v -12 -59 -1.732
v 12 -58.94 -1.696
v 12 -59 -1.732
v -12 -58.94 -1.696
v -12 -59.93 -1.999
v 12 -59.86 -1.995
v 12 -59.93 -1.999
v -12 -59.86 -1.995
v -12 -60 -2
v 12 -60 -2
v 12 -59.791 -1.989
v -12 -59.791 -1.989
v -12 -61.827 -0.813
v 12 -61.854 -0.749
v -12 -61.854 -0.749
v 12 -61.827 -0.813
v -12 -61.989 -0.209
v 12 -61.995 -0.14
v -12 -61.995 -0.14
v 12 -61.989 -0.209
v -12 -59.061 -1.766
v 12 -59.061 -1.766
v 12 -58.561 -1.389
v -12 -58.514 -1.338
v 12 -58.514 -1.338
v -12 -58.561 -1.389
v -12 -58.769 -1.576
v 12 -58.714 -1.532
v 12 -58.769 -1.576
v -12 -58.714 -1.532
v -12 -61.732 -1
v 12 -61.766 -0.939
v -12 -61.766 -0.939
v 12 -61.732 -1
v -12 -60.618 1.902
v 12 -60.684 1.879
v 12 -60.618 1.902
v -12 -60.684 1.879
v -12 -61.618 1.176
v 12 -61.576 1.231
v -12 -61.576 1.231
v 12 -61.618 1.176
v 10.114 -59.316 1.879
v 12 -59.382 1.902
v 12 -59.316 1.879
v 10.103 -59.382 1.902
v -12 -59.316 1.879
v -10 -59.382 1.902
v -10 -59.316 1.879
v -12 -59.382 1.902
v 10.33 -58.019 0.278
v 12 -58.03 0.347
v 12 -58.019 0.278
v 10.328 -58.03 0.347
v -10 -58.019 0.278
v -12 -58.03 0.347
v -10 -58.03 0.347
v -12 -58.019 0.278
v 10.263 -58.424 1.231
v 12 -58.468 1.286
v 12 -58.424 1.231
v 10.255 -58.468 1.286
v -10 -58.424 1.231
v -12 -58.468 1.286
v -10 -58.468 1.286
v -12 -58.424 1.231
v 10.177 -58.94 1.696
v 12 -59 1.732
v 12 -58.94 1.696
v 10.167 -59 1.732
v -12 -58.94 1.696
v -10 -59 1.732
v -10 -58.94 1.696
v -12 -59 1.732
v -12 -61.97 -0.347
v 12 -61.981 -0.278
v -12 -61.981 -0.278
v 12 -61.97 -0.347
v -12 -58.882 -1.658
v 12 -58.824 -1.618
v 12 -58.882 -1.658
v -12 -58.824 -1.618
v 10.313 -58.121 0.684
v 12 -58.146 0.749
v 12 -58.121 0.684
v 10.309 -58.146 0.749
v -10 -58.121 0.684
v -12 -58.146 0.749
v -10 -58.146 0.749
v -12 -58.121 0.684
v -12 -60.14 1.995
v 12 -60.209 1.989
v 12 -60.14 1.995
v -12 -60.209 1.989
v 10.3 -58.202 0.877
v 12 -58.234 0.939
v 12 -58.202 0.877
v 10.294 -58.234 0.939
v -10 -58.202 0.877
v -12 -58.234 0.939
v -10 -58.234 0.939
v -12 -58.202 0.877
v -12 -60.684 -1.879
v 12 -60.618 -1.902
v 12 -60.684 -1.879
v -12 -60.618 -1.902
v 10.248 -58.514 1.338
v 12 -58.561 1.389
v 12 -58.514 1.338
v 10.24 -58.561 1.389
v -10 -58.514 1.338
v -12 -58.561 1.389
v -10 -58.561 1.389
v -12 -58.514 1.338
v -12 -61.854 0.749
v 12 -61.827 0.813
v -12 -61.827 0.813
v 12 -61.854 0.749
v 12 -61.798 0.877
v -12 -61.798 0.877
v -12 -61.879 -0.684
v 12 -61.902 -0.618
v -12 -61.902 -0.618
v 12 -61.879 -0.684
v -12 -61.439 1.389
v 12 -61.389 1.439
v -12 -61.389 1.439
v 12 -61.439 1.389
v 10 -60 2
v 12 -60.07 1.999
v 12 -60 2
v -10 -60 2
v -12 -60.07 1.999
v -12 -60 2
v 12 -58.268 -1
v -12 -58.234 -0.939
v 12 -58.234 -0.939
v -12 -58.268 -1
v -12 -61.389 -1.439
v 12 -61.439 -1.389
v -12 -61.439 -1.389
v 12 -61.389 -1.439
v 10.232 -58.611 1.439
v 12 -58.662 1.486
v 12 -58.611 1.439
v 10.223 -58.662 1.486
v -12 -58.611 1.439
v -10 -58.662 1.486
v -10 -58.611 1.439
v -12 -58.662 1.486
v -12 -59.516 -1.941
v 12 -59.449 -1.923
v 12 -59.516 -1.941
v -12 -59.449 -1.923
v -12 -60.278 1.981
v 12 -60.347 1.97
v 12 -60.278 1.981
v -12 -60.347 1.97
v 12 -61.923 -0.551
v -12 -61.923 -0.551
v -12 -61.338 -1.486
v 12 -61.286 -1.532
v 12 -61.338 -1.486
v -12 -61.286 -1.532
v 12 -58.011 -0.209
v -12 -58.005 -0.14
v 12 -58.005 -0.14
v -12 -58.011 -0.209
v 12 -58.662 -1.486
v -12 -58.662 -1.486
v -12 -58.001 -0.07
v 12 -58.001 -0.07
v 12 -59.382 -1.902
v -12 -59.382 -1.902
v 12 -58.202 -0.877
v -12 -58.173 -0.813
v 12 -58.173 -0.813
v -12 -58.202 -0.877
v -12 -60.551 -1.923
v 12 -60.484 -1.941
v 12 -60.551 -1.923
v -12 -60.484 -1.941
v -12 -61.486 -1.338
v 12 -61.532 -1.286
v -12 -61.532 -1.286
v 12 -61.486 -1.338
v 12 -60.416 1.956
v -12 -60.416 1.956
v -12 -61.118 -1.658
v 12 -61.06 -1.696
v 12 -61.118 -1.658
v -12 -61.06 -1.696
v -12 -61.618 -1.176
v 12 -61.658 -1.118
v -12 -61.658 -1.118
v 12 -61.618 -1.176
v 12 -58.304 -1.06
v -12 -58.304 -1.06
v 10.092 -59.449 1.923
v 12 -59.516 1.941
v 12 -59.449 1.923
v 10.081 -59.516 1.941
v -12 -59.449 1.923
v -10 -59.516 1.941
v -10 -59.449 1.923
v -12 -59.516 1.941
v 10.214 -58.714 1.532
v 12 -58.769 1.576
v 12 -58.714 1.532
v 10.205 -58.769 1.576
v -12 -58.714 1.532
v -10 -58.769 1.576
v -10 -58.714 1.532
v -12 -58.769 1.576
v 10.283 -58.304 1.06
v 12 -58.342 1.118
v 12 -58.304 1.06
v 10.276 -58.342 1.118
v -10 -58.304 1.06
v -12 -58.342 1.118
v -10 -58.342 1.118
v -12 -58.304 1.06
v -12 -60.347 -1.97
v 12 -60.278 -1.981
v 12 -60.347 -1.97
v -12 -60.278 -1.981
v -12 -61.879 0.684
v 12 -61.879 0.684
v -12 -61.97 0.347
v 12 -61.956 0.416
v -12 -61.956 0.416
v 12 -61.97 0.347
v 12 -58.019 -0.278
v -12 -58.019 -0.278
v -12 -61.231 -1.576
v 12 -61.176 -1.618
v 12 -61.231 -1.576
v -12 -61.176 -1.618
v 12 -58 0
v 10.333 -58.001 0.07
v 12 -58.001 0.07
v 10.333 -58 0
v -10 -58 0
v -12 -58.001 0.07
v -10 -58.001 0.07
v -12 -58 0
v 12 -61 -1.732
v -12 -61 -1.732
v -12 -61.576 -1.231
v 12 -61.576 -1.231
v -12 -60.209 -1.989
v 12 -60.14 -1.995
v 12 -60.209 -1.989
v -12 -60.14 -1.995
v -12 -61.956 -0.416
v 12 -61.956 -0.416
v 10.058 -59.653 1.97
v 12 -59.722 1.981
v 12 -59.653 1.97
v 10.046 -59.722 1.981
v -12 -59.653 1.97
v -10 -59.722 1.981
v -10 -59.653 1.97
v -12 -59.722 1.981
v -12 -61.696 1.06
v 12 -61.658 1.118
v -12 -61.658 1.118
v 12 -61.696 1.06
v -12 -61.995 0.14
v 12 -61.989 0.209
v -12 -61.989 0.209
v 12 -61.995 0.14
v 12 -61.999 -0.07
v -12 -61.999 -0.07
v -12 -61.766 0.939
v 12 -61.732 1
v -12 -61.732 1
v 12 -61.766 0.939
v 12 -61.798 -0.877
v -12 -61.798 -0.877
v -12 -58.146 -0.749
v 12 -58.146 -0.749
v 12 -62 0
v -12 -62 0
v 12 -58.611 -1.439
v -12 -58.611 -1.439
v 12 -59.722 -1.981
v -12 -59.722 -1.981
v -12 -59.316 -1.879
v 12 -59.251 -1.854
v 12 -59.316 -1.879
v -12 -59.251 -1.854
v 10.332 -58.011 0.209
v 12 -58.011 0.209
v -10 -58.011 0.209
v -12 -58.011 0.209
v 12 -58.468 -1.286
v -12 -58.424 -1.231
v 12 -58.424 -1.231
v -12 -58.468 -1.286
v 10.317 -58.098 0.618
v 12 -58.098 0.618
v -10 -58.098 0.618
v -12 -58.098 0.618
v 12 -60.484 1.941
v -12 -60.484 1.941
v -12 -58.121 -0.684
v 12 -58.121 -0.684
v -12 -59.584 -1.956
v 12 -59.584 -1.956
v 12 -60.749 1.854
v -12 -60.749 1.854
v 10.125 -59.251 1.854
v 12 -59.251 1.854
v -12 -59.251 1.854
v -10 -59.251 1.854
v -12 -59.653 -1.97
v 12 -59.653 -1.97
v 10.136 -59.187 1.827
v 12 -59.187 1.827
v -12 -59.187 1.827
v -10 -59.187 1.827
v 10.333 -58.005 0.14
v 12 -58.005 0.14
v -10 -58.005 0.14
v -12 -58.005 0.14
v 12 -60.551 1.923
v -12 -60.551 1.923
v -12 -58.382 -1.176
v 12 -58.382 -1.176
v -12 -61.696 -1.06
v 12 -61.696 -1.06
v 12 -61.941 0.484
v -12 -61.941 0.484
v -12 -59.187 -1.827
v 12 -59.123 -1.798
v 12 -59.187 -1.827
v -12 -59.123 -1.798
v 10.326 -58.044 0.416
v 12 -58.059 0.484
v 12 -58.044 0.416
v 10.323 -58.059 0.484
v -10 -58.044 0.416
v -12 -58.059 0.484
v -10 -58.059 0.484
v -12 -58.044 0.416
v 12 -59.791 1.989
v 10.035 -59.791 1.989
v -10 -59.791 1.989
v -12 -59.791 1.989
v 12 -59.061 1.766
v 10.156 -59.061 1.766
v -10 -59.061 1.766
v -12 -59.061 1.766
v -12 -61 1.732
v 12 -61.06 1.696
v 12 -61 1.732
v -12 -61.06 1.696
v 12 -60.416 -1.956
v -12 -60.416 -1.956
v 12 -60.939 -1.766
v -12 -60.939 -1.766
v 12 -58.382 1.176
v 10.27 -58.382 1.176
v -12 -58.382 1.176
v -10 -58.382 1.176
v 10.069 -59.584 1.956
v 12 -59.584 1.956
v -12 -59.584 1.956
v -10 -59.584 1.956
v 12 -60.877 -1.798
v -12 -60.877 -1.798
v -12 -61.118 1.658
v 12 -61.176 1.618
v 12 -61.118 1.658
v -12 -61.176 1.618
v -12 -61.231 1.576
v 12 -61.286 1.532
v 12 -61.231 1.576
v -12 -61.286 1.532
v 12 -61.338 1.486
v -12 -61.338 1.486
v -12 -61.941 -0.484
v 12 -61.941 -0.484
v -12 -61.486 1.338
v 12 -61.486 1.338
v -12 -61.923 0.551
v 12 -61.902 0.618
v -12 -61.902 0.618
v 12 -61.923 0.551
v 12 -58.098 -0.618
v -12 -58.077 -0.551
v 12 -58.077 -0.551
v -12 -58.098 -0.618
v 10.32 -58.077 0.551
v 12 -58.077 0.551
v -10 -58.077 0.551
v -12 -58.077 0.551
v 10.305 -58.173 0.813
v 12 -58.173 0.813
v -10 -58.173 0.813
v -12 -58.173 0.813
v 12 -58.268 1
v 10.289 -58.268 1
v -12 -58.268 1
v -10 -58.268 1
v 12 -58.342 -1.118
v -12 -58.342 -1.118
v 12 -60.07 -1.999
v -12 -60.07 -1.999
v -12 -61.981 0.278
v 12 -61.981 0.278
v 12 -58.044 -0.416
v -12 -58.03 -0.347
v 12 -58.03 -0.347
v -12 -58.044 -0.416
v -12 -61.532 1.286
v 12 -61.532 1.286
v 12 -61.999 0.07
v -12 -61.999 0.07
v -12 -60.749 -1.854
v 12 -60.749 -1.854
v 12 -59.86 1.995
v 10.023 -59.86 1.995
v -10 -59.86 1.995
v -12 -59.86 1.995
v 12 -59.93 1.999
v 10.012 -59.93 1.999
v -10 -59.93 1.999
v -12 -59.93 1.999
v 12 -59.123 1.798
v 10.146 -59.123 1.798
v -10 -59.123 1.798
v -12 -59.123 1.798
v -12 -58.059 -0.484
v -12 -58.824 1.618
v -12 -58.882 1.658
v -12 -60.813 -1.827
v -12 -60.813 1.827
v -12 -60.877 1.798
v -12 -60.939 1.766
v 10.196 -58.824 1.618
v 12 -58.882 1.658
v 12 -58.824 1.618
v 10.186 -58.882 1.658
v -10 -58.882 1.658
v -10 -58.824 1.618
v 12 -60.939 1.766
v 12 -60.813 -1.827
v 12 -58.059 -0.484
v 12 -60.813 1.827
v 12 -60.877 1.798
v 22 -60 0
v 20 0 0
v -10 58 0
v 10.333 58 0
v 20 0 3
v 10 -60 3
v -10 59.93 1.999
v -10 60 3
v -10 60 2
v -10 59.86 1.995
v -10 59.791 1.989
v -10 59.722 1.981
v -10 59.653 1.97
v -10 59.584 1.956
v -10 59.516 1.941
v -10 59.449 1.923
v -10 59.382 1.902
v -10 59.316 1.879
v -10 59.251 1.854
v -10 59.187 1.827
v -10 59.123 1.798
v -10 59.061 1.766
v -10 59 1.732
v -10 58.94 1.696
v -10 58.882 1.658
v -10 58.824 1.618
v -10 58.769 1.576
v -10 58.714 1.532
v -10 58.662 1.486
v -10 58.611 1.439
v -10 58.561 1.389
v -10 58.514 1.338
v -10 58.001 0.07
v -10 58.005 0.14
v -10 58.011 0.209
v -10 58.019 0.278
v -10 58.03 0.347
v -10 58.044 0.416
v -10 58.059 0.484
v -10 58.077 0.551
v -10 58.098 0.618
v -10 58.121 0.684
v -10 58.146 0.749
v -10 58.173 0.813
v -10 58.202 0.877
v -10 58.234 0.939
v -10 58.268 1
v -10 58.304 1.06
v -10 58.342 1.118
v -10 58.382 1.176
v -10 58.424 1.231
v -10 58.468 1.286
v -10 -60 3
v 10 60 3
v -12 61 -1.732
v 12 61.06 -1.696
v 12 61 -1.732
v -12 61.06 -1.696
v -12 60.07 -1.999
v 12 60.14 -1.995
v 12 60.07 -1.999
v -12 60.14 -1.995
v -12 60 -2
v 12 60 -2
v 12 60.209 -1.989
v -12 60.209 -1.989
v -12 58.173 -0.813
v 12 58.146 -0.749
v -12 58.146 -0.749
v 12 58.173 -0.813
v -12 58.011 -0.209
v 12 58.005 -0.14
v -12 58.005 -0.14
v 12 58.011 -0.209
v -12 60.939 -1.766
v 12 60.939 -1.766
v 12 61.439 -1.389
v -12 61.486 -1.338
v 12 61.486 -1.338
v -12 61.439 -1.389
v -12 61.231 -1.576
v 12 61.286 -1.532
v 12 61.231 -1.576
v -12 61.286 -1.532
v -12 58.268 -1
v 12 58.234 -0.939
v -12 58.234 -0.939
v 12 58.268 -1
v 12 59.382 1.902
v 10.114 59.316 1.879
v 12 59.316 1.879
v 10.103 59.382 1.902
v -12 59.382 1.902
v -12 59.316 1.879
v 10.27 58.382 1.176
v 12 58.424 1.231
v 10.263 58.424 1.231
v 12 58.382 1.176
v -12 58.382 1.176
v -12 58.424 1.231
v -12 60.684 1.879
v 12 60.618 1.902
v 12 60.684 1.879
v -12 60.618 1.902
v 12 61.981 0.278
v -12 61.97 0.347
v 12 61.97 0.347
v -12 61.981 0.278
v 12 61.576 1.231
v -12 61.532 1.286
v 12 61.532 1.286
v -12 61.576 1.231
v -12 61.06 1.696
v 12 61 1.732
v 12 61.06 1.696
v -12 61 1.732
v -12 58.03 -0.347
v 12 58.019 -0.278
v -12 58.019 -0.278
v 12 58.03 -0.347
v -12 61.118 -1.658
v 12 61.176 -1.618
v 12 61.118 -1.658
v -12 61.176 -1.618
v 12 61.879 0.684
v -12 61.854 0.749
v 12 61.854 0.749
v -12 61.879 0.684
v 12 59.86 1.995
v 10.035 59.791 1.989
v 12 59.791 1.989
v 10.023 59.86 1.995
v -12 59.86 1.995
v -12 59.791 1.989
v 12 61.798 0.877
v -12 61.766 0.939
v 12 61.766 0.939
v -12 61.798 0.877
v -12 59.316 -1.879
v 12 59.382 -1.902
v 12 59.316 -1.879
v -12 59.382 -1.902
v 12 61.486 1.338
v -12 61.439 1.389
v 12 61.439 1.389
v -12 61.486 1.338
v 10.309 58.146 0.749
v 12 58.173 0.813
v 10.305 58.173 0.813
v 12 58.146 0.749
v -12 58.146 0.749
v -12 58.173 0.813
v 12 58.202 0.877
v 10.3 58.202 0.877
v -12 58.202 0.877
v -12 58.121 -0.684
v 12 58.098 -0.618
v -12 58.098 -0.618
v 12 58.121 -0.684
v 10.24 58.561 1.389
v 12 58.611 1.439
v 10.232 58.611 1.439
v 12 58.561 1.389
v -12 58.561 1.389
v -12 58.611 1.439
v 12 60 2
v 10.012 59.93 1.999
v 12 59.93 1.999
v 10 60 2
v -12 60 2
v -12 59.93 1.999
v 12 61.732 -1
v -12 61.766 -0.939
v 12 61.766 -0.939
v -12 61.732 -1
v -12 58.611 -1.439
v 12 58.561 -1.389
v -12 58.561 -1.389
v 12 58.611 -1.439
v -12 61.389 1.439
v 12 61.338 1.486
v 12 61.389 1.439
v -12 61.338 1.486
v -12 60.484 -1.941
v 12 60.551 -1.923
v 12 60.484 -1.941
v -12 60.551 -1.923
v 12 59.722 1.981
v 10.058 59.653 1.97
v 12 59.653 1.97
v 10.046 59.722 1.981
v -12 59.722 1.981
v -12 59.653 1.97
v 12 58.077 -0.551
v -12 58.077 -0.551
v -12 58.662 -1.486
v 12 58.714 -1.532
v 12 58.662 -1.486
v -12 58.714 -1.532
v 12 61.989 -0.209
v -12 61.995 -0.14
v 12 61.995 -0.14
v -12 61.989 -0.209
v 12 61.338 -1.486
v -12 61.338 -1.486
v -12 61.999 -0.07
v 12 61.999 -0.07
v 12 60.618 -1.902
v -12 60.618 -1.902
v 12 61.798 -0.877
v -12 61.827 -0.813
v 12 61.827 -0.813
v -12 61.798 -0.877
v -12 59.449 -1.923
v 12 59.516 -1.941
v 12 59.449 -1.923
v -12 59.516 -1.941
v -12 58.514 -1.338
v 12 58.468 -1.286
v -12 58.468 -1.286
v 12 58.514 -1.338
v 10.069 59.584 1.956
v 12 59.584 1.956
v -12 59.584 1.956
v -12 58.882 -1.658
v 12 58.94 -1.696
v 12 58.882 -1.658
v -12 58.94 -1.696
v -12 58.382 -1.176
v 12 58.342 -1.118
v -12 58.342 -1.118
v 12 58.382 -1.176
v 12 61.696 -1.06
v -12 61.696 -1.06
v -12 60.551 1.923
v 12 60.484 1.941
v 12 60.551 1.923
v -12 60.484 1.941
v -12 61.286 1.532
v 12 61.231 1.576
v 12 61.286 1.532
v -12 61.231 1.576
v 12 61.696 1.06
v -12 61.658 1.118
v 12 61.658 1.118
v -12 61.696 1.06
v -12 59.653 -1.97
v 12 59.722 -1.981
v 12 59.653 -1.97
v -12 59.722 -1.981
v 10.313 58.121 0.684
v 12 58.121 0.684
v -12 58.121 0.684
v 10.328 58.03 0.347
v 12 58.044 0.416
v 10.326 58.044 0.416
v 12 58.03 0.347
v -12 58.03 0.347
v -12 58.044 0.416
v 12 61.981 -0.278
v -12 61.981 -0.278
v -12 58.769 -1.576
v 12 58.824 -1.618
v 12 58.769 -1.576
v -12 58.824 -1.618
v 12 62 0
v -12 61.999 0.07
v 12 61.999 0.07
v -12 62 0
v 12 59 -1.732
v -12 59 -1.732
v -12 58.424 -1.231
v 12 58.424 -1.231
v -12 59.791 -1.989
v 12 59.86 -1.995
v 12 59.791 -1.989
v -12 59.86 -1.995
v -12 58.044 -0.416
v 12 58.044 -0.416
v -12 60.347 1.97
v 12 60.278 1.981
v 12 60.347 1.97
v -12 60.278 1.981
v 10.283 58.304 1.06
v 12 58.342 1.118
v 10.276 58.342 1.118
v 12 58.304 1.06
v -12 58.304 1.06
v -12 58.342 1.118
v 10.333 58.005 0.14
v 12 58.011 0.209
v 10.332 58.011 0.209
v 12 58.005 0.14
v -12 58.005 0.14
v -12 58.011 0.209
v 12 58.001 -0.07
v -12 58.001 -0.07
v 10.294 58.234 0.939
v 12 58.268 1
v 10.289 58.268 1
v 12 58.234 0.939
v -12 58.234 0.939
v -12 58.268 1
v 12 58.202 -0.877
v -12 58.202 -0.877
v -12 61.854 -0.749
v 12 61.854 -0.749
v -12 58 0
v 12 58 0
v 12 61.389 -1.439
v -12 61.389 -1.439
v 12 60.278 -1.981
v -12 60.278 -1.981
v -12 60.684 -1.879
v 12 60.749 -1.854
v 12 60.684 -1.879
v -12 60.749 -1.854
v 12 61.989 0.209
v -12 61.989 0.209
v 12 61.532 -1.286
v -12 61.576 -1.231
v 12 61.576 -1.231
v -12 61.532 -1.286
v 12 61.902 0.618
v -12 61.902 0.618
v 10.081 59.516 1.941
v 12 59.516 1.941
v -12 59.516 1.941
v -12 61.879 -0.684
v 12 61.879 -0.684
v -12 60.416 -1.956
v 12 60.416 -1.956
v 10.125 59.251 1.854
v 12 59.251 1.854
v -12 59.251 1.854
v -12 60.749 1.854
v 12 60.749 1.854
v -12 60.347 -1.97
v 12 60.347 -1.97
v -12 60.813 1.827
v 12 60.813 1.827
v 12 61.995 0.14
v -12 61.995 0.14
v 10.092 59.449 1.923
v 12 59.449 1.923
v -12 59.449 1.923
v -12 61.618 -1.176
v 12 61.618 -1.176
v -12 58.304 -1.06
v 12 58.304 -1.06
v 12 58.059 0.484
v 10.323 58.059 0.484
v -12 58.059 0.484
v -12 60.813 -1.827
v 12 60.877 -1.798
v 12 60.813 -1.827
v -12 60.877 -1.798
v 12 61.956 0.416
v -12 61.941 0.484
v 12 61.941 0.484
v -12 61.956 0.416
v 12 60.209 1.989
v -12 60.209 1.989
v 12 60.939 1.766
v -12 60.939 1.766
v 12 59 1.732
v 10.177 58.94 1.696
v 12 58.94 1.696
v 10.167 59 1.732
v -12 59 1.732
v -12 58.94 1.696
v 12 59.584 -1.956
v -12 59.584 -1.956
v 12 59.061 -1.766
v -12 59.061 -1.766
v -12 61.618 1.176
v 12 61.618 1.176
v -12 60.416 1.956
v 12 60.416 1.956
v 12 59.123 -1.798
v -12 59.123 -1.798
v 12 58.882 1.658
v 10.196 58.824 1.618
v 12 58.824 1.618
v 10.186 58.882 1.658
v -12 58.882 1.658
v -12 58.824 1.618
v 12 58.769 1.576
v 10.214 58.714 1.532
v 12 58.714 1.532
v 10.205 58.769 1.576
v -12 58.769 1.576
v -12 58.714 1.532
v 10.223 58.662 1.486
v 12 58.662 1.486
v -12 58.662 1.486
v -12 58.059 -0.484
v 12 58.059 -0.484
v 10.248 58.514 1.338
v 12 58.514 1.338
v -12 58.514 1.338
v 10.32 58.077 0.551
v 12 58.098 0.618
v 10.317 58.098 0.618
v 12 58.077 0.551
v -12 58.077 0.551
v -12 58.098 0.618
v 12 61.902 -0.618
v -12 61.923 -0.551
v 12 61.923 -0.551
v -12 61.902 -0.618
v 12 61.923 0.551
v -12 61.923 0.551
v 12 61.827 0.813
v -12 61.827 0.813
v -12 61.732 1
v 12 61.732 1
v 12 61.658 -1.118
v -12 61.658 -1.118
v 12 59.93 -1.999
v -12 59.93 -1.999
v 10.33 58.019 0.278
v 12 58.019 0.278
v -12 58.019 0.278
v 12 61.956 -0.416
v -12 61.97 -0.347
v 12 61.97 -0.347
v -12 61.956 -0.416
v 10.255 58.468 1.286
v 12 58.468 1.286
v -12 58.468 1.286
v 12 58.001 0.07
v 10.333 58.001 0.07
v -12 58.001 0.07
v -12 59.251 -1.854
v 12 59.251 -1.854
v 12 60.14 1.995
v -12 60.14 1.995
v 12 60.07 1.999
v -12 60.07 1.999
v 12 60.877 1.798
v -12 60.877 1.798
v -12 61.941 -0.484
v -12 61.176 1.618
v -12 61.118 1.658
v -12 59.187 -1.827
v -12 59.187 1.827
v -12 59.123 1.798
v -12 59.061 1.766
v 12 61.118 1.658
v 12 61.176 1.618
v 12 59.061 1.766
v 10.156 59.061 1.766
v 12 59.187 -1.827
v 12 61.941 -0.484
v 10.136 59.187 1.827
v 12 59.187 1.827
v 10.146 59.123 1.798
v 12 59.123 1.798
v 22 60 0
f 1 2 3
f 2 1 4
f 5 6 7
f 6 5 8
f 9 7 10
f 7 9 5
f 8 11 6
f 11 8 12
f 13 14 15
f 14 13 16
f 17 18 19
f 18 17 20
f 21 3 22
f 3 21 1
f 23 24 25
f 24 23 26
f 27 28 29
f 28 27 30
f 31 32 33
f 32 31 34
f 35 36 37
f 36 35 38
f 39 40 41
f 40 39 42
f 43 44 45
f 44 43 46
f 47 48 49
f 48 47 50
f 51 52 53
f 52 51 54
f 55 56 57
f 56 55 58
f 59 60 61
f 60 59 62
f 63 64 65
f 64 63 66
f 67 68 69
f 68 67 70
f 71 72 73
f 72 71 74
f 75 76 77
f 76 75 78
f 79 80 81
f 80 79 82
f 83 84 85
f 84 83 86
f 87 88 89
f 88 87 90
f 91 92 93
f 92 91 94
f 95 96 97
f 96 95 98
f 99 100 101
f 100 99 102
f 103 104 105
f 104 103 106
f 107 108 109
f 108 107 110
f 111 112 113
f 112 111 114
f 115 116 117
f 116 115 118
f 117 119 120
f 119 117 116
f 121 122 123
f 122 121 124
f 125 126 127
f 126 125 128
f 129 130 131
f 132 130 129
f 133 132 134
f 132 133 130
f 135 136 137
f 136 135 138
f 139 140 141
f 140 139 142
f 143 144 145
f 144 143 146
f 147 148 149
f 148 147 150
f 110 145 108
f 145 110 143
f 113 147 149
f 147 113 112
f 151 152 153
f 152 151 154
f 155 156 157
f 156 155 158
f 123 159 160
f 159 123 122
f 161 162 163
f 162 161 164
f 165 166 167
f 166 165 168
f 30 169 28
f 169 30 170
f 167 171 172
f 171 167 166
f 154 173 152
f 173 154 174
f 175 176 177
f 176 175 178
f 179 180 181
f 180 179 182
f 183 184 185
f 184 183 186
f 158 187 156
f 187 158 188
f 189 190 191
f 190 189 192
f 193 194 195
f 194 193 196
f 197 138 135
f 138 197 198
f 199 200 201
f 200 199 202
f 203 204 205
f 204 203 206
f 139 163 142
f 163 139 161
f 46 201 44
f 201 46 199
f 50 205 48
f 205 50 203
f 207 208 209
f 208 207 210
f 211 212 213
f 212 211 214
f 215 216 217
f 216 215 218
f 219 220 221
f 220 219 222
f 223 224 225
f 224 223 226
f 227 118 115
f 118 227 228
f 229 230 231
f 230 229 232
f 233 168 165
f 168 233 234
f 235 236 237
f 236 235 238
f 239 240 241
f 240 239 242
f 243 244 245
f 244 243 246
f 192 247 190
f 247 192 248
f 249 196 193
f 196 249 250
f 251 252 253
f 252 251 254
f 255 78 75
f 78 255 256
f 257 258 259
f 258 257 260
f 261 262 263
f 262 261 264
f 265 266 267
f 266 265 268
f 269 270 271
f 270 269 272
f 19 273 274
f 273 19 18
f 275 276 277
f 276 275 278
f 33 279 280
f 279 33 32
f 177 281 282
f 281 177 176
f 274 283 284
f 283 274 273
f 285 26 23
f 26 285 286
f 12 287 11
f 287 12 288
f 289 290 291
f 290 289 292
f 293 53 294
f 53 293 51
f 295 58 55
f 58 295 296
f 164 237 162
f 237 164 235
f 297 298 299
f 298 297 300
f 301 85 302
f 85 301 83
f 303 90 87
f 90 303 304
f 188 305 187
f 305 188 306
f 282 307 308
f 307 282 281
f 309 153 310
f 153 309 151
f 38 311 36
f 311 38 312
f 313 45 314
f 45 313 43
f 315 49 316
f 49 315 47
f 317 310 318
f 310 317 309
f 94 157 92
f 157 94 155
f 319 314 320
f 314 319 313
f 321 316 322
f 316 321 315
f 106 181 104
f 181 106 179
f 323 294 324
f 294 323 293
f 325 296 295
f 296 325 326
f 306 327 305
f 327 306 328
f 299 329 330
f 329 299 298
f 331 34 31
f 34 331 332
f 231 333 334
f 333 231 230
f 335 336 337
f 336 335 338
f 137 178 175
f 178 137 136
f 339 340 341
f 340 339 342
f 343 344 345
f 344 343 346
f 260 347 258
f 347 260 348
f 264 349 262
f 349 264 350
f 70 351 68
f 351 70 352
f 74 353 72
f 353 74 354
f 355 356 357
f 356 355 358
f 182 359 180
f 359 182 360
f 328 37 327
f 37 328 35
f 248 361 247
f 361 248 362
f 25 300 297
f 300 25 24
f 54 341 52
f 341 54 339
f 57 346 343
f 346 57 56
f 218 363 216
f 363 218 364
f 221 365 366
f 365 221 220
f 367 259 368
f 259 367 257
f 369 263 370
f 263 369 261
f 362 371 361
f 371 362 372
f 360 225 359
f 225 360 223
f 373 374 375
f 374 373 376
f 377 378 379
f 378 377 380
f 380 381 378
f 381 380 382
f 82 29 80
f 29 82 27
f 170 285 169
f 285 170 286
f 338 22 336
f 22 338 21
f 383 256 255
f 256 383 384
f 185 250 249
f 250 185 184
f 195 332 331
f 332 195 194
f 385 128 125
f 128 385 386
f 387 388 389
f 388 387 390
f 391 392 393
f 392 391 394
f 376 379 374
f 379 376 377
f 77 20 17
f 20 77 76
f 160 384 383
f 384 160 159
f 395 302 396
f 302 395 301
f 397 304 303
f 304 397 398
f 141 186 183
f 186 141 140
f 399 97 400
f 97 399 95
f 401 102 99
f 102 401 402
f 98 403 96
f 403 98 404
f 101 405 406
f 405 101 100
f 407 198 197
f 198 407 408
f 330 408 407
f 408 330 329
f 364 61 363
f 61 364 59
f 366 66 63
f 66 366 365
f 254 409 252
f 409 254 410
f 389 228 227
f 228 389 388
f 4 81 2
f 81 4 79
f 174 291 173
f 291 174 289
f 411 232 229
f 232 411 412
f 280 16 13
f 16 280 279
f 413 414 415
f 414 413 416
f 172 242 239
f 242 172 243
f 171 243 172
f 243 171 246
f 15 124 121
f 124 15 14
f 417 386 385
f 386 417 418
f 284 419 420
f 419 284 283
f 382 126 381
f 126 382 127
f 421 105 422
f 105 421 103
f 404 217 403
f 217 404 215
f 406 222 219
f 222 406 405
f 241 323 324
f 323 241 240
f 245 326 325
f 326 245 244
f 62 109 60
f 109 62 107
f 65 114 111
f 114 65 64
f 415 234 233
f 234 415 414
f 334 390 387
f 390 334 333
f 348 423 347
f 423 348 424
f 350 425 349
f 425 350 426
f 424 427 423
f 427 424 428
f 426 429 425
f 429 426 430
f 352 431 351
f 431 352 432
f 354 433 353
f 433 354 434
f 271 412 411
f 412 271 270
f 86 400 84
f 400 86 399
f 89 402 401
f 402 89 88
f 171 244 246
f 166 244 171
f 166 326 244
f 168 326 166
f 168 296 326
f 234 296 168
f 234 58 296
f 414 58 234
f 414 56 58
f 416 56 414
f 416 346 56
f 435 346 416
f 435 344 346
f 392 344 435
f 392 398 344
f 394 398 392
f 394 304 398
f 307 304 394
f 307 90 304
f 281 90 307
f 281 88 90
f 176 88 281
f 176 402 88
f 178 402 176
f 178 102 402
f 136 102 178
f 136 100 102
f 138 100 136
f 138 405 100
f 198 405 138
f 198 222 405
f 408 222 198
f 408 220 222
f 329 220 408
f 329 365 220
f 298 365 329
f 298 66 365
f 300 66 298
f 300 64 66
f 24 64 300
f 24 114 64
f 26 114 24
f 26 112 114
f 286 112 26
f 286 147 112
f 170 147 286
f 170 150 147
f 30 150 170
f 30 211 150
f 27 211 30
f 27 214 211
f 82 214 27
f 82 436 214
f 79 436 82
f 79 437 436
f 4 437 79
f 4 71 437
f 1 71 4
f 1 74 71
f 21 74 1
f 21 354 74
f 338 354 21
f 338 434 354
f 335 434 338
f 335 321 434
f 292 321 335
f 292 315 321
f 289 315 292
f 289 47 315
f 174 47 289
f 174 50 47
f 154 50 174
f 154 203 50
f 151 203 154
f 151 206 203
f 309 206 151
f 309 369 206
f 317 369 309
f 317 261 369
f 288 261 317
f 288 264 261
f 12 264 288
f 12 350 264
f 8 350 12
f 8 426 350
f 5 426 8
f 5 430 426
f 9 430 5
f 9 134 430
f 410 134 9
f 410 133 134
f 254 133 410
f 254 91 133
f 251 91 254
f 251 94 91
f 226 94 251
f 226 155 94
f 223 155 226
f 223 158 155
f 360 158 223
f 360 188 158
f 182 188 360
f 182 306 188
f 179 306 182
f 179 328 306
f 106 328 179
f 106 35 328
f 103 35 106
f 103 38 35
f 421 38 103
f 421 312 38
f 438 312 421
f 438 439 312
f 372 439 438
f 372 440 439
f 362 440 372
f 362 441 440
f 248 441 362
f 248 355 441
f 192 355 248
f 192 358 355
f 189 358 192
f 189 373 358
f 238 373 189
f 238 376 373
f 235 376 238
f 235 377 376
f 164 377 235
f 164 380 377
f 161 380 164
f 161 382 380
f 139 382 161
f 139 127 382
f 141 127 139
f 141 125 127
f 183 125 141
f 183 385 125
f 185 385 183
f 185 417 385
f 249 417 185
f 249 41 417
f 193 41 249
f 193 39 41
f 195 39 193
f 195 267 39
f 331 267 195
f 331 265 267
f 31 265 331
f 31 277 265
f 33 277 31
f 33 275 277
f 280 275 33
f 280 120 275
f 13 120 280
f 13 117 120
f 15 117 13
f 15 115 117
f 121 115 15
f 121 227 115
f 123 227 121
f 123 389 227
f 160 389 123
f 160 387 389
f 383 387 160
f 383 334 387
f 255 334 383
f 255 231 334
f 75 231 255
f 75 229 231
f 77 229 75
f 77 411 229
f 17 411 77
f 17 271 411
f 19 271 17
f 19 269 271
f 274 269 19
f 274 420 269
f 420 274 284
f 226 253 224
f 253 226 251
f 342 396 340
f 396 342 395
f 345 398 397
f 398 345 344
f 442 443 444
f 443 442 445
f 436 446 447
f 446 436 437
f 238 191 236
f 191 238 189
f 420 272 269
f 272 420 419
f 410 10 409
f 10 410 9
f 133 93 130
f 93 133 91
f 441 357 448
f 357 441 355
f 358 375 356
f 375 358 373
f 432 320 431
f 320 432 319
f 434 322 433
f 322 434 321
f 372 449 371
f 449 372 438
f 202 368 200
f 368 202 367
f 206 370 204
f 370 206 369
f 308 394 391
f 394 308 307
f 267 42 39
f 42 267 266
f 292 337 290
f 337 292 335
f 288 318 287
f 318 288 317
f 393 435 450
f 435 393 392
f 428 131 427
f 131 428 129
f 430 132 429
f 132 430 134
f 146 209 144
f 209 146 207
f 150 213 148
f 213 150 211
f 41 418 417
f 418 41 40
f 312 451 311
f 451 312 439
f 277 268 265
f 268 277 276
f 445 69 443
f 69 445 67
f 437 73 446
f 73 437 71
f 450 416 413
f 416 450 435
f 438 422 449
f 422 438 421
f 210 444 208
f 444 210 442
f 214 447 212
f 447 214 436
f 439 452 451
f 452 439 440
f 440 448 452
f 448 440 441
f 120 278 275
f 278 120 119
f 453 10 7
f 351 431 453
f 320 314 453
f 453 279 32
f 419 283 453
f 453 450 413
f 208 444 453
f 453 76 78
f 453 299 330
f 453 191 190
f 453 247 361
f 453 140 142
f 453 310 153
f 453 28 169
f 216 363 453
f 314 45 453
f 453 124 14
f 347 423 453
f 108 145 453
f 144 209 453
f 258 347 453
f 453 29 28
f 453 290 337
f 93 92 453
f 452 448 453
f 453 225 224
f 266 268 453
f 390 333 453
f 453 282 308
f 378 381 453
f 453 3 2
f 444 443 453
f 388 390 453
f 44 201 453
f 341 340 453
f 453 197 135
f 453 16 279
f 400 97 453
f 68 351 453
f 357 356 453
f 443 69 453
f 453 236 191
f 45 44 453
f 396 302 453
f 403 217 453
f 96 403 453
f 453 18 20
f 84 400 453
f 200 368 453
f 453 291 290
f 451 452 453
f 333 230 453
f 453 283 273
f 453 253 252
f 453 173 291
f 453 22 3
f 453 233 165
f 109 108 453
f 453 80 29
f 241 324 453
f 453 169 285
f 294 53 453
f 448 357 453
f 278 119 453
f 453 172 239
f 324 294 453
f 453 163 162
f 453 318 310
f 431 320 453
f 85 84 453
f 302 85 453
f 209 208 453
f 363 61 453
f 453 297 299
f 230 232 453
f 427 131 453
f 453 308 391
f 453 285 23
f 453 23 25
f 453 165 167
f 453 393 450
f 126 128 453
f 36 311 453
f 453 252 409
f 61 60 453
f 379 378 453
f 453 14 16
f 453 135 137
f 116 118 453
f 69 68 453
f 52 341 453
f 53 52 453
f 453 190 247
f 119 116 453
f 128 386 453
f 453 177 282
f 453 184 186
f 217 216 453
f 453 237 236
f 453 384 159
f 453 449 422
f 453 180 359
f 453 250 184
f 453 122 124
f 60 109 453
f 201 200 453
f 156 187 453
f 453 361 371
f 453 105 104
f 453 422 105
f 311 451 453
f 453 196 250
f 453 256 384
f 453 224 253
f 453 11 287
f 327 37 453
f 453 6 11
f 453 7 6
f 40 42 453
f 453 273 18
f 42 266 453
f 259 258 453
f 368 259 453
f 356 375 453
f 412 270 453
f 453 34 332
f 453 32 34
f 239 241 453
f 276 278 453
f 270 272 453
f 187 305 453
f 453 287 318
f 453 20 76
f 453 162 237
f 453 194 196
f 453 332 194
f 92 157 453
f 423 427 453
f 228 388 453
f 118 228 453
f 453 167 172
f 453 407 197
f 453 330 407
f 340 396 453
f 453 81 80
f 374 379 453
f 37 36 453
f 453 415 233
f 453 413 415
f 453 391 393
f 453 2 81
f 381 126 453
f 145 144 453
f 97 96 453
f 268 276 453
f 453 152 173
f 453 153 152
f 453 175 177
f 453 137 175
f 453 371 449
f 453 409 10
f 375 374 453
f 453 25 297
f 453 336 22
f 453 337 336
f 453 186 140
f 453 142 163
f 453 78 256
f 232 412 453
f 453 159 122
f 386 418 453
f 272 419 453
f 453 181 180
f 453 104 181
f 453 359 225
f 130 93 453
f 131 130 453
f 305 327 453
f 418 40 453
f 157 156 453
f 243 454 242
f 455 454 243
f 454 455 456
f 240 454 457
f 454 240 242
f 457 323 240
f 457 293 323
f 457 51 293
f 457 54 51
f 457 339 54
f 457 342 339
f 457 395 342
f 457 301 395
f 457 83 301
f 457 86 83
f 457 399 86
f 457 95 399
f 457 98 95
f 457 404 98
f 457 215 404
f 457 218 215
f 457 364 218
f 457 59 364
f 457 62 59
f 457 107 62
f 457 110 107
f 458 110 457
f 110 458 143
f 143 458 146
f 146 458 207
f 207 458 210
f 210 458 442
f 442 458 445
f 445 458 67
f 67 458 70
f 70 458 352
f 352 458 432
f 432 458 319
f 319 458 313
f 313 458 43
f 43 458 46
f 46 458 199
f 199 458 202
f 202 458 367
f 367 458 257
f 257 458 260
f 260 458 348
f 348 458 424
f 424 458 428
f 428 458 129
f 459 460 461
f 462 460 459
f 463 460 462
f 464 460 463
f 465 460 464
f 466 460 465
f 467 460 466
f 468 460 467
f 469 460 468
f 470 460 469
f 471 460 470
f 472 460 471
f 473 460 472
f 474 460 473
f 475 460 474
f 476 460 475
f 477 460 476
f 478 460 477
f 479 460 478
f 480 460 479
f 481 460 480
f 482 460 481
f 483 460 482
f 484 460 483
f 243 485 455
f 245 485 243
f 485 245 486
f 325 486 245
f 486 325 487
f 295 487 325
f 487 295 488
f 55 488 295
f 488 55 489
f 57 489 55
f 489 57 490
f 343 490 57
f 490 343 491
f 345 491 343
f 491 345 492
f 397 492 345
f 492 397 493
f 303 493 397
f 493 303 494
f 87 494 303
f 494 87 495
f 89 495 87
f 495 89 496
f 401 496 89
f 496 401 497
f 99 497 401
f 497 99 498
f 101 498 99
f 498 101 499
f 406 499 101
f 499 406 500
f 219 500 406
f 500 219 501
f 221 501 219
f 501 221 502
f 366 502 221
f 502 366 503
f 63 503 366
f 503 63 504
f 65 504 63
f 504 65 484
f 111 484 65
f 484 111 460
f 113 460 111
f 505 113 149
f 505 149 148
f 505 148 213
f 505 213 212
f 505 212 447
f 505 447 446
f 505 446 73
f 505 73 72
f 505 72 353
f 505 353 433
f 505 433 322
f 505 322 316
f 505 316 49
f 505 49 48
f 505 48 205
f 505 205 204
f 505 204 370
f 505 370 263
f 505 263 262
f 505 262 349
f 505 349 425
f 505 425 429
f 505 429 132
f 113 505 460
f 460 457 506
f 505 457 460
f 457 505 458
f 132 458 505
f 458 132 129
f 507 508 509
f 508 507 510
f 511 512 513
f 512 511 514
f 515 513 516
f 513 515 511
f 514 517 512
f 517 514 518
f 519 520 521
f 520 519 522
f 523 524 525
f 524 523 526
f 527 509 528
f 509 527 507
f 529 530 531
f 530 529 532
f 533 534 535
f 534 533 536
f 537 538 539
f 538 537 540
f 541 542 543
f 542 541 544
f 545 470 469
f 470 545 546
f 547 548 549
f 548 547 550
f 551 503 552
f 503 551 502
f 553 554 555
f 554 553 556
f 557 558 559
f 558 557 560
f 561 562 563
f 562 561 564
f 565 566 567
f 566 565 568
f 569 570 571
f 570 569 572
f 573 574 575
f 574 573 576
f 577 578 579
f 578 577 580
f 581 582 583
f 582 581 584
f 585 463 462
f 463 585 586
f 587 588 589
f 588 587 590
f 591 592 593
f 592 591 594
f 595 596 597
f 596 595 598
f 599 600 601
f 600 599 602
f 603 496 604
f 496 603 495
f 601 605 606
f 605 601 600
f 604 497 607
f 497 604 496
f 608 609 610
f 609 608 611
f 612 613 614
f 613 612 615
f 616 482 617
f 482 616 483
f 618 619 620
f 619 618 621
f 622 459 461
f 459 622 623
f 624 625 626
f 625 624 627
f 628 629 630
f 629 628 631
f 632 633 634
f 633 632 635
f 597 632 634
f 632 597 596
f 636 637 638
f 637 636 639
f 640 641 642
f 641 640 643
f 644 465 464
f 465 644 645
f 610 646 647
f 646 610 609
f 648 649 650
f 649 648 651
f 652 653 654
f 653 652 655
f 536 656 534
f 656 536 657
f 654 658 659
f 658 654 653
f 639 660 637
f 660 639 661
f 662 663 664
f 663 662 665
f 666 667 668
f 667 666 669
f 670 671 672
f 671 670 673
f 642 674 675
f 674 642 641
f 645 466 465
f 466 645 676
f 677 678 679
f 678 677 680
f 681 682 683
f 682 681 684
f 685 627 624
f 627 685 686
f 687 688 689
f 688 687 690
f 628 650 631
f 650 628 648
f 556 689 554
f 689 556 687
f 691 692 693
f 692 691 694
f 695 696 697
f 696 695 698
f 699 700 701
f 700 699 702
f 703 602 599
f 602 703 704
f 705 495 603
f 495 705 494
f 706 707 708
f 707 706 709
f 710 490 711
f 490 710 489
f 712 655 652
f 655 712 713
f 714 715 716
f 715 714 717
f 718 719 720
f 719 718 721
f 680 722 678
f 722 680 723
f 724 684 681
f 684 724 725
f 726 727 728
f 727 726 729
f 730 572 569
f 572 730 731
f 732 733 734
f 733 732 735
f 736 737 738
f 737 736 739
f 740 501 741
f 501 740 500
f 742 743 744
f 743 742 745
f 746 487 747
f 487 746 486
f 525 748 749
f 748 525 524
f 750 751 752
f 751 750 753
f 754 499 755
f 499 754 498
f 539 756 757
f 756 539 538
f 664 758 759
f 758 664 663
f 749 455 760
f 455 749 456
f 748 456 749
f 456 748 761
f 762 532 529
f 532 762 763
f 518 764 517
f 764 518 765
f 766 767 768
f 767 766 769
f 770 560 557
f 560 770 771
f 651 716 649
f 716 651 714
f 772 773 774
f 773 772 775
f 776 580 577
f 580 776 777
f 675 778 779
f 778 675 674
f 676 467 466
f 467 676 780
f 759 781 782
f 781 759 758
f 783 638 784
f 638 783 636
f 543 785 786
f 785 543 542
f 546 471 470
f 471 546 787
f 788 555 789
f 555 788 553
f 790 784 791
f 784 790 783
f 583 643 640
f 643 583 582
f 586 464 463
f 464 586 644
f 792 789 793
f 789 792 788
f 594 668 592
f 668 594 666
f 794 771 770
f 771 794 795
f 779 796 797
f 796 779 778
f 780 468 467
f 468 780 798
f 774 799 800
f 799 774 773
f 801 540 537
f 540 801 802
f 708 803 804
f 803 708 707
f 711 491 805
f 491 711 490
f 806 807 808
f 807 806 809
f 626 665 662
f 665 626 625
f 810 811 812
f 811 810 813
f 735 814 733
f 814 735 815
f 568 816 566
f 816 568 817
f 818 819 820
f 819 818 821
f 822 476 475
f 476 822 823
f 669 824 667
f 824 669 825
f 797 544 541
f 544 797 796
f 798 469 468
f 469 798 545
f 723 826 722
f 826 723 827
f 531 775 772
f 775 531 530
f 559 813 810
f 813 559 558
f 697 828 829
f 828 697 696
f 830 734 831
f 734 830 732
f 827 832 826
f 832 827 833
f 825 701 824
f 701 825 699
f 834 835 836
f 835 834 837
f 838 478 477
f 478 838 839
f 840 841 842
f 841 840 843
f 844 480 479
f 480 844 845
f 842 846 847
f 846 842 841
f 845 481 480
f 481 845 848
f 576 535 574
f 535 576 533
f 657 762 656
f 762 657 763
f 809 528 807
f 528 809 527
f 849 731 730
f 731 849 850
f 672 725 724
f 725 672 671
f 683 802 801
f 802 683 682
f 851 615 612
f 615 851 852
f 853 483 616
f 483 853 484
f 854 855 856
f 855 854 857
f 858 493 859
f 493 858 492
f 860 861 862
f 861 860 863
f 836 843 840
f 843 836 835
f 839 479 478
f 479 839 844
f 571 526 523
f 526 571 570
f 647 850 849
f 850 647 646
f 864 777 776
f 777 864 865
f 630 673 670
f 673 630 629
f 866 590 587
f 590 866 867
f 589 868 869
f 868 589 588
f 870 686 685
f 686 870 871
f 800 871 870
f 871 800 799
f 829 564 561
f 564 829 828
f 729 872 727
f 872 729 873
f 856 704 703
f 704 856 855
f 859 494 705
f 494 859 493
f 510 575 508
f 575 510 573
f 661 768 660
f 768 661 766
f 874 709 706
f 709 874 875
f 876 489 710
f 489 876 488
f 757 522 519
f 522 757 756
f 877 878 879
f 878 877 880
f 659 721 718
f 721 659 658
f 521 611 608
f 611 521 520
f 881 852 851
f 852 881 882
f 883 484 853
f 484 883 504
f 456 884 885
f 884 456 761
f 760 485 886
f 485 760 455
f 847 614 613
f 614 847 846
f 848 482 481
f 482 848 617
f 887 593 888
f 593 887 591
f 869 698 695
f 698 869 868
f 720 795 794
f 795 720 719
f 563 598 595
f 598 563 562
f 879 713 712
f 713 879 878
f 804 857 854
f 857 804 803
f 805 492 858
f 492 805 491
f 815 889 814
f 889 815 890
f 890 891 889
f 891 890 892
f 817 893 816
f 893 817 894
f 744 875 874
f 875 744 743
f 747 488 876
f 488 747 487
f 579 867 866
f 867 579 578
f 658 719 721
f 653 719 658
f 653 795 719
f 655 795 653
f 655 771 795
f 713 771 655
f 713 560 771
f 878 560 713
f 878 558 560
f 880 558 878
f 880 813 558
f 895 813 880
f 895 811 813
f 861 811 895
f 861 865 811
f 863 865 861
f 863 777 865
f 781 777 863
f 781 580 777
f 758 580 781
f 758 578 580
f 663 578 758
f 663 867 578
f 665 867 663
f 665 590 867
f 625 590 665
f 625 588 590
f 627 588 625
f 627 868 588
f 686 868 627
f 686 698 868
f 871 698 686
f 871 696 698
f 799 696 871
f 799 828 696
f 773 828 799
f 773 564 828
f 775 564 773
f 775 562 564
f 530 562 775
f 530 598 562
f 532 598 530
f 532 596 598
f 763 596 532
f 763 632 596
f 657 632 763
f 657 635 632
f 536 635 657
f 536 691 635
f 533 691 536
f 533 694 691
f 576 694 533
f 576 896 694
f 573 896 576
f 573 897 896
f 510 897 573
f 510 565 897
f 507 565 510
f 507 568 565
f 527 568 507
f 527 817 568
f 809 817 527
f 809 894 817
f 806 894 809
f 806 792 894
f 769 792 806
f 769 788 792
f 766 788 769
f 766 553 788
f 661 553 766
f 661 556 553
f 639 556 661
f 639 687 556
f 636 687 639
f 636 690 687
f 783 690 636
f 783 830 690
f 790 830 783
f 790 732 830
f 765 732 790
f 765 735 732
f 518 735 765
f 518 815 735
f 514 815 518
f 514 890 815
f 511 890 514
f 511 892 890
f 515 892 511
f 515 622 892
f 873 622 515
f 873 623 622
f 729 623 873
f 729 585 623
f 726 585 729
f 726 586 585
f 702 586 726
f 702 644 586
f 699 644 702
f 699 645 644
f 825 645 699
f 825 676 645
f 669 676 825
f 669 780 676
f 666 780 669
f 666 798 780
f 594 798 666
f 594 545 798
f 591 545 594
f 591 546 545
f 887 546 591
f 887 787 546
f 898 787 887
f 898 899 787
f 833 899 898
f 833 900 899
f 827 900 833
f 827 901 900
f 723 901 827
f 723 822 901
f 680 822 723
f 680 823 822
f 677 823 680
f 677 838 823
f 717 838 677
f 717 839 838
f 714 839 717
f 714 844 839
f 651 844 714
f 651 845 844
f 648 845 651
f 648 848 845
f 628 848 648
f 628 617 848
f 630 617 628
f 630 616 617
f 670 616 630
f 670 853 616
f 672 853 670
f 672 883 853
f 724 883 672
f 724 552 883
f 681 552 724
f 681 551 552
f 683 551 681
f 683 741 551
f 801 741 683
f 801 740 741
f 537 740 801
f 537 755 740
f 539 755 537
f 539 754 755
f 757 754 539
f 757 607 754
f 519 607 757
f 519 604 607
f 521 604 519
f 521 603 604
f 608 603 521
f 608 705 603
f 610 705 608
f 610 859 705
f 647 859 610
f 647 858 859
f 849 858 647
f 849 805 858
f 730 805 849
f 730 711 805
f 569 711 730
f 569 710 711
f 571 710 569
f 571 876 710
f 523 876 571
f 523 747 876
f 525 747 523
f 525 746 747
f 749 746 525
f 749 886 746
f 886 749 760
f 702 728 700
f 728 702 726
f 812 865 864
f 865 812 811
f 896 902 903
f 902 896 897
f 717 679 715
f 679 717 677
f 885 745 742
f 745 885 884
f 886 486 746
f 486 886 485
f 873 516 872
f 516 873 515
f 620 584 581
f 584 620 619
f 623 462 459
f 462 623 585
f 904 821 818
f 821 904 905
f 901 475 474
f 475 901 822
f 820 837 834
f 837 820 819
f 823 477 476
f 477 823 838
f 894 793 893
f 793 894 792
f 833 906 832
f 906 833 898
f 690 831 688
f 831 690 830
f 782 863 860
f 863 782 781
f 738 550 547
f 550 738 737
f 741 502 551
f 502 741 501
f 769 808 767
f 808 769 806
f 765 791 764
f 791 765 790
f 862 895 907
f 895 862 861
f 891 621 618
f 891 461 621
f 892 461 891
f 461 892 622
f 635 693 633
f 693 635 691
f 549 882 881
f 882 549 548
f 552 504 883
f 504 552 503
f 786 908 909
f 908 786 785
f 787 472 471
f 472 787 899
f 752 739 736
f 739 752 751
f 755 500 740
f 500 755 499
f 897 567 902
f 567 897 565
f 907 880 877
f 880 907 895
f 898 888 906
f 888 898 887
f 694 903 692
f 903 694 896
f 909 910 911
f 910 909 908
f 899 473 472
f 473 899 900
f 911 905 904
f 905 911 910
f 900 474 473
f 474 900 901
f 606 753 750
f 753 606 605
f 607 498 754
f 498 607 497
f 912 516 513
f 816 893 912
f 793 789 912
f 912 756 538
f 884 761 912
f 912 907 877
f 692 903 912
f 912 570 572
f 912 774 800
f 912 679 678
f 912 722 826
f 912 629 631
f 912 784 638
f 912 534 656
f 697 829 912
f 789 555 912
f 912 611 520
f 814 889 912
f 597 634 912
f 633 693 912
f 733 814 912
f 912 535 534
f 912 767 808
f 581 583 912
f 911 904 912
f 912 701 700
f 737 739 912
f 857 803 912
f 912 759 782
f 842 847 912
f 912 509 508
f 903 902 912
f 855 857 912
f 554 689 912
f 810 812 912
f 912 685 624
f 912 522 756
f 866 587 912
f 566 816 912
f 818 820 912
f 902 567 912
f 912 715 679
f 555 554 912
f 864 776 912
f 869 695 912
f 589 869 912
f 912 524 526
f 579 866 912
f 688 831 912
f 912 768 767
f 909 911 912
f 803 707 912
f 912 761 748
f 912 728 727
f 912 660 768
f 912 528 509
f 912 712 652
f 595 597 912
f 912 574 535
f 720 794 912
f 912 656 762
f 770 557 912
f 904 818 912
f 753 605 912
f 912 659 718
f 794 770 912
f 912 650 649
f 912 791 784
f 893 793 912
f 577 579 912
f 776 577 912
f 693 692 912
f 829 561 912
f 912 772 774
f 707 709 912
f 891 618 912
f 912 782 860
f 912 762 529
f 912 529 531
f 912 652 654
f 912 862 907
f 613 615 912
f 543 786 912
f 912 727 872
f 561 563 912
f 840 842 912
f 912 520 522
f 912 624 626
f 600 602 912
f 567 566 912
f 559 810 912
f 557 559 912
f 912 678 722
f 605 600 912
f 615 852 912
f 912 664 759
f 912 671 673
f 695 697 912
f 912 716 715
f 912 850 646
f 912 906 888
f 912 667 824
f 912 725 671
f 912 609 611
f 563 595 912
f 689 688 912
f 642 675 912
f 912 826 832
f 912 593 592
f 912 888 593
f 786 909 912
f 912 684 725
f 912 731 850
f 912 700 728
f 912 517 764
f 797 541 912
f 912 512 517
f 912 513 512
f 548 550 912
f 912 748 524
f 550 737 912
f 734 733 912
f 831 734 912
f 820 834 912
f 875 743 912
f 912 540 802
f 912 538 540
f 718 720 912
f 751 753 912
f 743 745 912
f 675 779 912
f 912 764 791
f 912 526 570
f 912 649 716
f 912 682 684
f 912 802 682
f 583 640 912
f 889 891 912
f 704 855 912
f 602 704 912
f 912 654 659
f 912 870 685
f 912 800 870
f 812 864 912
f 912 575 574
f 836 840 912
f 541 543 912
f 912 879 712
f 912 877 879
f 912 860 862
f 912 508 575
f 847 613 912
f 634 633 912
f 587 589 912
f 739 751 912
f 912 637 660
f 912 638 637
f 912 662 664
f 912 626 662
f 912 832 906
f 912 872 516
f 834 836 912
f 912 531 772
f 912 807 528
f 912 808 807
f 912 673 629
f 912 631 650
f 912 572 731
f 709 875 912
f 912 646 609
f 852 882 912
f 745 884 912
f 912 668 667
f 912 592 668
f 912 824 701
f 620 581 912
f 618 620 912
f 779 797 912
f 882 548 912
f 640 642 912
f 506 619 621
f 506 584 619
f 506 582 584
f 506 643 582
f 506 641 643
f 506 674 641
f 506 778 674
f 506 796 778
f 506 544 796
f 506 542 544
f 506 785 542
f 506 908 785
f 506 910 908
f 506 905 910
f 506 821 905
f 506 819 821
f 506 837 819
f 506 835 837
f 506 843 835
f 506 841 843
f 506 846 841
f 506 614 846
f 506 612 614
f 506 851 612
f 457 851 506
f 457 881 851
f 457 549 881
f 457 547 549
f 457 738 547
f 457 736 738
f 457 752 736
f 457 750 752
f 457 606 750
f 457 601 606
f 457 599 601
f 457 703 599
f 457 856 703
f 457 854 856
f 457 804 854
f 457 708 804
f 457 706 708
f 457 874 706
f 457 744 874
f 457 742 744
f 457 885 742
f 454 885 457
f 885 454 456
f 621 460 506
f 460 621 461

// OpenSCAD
///////////////////////////////////////////////////////////////////////////////
// Filename 	: SimpleWings.scad
// Main Module 	: Plane
// Sub-module 	: Wings
// Version  	: v1.0
// Category 	: Transportation
// Modified 	: 18 Sept 2016
// Author   	: Jason Yeo
///////////////////////////////////////////////////////////////////////////////
// Refer to drawing for Plane.pptx.
//
// A SIMPLE PLANE
// 
///////////////////////////////////////////////////////////////////////////////
$fn=180;
Wing();
Wing(left=true);
//Rocket(100);
//Flap(20, 40, 120, 3);

module Wing(w1=20, w2=40, w_length=120, t1=3, left=false)
{	
	color("LightGreen")
	if(left==false) {
		Flap(w1, w2, -w_length, t1);
        translate([0,-w_length/2,0]) Rocket(w1);
	}	
	else {
	     Flap(w1, w2, w_length, t1);
         translate([0,w_length/2,0]) Rocket(w1);
	}
    
}

module Flap(f1,f2, f_length, t1=3)
{
    echo(f1, f2, f_length, t1);
    linear_extrude(t1) polygon([[-f1/2,0],[-f1/2, f_length/2], [f1/2, f_length/2], [f2/2,0]]);
}

module Rocket(length)
{
    d1=length*0.1;
    body=length*1.2;
    warhead=length*0.5;
    rotate([0,90,0])
    {
        cylinder(body, d1, d1, center=true);
        translate([0,0, body/2+warhead/2]) cylinder(warhead, d1, 0, center=true);
    }
       
    
    
}
//function computePoints(wingspan,left)=(left ? wingspan/2 : wingspan/-2);
